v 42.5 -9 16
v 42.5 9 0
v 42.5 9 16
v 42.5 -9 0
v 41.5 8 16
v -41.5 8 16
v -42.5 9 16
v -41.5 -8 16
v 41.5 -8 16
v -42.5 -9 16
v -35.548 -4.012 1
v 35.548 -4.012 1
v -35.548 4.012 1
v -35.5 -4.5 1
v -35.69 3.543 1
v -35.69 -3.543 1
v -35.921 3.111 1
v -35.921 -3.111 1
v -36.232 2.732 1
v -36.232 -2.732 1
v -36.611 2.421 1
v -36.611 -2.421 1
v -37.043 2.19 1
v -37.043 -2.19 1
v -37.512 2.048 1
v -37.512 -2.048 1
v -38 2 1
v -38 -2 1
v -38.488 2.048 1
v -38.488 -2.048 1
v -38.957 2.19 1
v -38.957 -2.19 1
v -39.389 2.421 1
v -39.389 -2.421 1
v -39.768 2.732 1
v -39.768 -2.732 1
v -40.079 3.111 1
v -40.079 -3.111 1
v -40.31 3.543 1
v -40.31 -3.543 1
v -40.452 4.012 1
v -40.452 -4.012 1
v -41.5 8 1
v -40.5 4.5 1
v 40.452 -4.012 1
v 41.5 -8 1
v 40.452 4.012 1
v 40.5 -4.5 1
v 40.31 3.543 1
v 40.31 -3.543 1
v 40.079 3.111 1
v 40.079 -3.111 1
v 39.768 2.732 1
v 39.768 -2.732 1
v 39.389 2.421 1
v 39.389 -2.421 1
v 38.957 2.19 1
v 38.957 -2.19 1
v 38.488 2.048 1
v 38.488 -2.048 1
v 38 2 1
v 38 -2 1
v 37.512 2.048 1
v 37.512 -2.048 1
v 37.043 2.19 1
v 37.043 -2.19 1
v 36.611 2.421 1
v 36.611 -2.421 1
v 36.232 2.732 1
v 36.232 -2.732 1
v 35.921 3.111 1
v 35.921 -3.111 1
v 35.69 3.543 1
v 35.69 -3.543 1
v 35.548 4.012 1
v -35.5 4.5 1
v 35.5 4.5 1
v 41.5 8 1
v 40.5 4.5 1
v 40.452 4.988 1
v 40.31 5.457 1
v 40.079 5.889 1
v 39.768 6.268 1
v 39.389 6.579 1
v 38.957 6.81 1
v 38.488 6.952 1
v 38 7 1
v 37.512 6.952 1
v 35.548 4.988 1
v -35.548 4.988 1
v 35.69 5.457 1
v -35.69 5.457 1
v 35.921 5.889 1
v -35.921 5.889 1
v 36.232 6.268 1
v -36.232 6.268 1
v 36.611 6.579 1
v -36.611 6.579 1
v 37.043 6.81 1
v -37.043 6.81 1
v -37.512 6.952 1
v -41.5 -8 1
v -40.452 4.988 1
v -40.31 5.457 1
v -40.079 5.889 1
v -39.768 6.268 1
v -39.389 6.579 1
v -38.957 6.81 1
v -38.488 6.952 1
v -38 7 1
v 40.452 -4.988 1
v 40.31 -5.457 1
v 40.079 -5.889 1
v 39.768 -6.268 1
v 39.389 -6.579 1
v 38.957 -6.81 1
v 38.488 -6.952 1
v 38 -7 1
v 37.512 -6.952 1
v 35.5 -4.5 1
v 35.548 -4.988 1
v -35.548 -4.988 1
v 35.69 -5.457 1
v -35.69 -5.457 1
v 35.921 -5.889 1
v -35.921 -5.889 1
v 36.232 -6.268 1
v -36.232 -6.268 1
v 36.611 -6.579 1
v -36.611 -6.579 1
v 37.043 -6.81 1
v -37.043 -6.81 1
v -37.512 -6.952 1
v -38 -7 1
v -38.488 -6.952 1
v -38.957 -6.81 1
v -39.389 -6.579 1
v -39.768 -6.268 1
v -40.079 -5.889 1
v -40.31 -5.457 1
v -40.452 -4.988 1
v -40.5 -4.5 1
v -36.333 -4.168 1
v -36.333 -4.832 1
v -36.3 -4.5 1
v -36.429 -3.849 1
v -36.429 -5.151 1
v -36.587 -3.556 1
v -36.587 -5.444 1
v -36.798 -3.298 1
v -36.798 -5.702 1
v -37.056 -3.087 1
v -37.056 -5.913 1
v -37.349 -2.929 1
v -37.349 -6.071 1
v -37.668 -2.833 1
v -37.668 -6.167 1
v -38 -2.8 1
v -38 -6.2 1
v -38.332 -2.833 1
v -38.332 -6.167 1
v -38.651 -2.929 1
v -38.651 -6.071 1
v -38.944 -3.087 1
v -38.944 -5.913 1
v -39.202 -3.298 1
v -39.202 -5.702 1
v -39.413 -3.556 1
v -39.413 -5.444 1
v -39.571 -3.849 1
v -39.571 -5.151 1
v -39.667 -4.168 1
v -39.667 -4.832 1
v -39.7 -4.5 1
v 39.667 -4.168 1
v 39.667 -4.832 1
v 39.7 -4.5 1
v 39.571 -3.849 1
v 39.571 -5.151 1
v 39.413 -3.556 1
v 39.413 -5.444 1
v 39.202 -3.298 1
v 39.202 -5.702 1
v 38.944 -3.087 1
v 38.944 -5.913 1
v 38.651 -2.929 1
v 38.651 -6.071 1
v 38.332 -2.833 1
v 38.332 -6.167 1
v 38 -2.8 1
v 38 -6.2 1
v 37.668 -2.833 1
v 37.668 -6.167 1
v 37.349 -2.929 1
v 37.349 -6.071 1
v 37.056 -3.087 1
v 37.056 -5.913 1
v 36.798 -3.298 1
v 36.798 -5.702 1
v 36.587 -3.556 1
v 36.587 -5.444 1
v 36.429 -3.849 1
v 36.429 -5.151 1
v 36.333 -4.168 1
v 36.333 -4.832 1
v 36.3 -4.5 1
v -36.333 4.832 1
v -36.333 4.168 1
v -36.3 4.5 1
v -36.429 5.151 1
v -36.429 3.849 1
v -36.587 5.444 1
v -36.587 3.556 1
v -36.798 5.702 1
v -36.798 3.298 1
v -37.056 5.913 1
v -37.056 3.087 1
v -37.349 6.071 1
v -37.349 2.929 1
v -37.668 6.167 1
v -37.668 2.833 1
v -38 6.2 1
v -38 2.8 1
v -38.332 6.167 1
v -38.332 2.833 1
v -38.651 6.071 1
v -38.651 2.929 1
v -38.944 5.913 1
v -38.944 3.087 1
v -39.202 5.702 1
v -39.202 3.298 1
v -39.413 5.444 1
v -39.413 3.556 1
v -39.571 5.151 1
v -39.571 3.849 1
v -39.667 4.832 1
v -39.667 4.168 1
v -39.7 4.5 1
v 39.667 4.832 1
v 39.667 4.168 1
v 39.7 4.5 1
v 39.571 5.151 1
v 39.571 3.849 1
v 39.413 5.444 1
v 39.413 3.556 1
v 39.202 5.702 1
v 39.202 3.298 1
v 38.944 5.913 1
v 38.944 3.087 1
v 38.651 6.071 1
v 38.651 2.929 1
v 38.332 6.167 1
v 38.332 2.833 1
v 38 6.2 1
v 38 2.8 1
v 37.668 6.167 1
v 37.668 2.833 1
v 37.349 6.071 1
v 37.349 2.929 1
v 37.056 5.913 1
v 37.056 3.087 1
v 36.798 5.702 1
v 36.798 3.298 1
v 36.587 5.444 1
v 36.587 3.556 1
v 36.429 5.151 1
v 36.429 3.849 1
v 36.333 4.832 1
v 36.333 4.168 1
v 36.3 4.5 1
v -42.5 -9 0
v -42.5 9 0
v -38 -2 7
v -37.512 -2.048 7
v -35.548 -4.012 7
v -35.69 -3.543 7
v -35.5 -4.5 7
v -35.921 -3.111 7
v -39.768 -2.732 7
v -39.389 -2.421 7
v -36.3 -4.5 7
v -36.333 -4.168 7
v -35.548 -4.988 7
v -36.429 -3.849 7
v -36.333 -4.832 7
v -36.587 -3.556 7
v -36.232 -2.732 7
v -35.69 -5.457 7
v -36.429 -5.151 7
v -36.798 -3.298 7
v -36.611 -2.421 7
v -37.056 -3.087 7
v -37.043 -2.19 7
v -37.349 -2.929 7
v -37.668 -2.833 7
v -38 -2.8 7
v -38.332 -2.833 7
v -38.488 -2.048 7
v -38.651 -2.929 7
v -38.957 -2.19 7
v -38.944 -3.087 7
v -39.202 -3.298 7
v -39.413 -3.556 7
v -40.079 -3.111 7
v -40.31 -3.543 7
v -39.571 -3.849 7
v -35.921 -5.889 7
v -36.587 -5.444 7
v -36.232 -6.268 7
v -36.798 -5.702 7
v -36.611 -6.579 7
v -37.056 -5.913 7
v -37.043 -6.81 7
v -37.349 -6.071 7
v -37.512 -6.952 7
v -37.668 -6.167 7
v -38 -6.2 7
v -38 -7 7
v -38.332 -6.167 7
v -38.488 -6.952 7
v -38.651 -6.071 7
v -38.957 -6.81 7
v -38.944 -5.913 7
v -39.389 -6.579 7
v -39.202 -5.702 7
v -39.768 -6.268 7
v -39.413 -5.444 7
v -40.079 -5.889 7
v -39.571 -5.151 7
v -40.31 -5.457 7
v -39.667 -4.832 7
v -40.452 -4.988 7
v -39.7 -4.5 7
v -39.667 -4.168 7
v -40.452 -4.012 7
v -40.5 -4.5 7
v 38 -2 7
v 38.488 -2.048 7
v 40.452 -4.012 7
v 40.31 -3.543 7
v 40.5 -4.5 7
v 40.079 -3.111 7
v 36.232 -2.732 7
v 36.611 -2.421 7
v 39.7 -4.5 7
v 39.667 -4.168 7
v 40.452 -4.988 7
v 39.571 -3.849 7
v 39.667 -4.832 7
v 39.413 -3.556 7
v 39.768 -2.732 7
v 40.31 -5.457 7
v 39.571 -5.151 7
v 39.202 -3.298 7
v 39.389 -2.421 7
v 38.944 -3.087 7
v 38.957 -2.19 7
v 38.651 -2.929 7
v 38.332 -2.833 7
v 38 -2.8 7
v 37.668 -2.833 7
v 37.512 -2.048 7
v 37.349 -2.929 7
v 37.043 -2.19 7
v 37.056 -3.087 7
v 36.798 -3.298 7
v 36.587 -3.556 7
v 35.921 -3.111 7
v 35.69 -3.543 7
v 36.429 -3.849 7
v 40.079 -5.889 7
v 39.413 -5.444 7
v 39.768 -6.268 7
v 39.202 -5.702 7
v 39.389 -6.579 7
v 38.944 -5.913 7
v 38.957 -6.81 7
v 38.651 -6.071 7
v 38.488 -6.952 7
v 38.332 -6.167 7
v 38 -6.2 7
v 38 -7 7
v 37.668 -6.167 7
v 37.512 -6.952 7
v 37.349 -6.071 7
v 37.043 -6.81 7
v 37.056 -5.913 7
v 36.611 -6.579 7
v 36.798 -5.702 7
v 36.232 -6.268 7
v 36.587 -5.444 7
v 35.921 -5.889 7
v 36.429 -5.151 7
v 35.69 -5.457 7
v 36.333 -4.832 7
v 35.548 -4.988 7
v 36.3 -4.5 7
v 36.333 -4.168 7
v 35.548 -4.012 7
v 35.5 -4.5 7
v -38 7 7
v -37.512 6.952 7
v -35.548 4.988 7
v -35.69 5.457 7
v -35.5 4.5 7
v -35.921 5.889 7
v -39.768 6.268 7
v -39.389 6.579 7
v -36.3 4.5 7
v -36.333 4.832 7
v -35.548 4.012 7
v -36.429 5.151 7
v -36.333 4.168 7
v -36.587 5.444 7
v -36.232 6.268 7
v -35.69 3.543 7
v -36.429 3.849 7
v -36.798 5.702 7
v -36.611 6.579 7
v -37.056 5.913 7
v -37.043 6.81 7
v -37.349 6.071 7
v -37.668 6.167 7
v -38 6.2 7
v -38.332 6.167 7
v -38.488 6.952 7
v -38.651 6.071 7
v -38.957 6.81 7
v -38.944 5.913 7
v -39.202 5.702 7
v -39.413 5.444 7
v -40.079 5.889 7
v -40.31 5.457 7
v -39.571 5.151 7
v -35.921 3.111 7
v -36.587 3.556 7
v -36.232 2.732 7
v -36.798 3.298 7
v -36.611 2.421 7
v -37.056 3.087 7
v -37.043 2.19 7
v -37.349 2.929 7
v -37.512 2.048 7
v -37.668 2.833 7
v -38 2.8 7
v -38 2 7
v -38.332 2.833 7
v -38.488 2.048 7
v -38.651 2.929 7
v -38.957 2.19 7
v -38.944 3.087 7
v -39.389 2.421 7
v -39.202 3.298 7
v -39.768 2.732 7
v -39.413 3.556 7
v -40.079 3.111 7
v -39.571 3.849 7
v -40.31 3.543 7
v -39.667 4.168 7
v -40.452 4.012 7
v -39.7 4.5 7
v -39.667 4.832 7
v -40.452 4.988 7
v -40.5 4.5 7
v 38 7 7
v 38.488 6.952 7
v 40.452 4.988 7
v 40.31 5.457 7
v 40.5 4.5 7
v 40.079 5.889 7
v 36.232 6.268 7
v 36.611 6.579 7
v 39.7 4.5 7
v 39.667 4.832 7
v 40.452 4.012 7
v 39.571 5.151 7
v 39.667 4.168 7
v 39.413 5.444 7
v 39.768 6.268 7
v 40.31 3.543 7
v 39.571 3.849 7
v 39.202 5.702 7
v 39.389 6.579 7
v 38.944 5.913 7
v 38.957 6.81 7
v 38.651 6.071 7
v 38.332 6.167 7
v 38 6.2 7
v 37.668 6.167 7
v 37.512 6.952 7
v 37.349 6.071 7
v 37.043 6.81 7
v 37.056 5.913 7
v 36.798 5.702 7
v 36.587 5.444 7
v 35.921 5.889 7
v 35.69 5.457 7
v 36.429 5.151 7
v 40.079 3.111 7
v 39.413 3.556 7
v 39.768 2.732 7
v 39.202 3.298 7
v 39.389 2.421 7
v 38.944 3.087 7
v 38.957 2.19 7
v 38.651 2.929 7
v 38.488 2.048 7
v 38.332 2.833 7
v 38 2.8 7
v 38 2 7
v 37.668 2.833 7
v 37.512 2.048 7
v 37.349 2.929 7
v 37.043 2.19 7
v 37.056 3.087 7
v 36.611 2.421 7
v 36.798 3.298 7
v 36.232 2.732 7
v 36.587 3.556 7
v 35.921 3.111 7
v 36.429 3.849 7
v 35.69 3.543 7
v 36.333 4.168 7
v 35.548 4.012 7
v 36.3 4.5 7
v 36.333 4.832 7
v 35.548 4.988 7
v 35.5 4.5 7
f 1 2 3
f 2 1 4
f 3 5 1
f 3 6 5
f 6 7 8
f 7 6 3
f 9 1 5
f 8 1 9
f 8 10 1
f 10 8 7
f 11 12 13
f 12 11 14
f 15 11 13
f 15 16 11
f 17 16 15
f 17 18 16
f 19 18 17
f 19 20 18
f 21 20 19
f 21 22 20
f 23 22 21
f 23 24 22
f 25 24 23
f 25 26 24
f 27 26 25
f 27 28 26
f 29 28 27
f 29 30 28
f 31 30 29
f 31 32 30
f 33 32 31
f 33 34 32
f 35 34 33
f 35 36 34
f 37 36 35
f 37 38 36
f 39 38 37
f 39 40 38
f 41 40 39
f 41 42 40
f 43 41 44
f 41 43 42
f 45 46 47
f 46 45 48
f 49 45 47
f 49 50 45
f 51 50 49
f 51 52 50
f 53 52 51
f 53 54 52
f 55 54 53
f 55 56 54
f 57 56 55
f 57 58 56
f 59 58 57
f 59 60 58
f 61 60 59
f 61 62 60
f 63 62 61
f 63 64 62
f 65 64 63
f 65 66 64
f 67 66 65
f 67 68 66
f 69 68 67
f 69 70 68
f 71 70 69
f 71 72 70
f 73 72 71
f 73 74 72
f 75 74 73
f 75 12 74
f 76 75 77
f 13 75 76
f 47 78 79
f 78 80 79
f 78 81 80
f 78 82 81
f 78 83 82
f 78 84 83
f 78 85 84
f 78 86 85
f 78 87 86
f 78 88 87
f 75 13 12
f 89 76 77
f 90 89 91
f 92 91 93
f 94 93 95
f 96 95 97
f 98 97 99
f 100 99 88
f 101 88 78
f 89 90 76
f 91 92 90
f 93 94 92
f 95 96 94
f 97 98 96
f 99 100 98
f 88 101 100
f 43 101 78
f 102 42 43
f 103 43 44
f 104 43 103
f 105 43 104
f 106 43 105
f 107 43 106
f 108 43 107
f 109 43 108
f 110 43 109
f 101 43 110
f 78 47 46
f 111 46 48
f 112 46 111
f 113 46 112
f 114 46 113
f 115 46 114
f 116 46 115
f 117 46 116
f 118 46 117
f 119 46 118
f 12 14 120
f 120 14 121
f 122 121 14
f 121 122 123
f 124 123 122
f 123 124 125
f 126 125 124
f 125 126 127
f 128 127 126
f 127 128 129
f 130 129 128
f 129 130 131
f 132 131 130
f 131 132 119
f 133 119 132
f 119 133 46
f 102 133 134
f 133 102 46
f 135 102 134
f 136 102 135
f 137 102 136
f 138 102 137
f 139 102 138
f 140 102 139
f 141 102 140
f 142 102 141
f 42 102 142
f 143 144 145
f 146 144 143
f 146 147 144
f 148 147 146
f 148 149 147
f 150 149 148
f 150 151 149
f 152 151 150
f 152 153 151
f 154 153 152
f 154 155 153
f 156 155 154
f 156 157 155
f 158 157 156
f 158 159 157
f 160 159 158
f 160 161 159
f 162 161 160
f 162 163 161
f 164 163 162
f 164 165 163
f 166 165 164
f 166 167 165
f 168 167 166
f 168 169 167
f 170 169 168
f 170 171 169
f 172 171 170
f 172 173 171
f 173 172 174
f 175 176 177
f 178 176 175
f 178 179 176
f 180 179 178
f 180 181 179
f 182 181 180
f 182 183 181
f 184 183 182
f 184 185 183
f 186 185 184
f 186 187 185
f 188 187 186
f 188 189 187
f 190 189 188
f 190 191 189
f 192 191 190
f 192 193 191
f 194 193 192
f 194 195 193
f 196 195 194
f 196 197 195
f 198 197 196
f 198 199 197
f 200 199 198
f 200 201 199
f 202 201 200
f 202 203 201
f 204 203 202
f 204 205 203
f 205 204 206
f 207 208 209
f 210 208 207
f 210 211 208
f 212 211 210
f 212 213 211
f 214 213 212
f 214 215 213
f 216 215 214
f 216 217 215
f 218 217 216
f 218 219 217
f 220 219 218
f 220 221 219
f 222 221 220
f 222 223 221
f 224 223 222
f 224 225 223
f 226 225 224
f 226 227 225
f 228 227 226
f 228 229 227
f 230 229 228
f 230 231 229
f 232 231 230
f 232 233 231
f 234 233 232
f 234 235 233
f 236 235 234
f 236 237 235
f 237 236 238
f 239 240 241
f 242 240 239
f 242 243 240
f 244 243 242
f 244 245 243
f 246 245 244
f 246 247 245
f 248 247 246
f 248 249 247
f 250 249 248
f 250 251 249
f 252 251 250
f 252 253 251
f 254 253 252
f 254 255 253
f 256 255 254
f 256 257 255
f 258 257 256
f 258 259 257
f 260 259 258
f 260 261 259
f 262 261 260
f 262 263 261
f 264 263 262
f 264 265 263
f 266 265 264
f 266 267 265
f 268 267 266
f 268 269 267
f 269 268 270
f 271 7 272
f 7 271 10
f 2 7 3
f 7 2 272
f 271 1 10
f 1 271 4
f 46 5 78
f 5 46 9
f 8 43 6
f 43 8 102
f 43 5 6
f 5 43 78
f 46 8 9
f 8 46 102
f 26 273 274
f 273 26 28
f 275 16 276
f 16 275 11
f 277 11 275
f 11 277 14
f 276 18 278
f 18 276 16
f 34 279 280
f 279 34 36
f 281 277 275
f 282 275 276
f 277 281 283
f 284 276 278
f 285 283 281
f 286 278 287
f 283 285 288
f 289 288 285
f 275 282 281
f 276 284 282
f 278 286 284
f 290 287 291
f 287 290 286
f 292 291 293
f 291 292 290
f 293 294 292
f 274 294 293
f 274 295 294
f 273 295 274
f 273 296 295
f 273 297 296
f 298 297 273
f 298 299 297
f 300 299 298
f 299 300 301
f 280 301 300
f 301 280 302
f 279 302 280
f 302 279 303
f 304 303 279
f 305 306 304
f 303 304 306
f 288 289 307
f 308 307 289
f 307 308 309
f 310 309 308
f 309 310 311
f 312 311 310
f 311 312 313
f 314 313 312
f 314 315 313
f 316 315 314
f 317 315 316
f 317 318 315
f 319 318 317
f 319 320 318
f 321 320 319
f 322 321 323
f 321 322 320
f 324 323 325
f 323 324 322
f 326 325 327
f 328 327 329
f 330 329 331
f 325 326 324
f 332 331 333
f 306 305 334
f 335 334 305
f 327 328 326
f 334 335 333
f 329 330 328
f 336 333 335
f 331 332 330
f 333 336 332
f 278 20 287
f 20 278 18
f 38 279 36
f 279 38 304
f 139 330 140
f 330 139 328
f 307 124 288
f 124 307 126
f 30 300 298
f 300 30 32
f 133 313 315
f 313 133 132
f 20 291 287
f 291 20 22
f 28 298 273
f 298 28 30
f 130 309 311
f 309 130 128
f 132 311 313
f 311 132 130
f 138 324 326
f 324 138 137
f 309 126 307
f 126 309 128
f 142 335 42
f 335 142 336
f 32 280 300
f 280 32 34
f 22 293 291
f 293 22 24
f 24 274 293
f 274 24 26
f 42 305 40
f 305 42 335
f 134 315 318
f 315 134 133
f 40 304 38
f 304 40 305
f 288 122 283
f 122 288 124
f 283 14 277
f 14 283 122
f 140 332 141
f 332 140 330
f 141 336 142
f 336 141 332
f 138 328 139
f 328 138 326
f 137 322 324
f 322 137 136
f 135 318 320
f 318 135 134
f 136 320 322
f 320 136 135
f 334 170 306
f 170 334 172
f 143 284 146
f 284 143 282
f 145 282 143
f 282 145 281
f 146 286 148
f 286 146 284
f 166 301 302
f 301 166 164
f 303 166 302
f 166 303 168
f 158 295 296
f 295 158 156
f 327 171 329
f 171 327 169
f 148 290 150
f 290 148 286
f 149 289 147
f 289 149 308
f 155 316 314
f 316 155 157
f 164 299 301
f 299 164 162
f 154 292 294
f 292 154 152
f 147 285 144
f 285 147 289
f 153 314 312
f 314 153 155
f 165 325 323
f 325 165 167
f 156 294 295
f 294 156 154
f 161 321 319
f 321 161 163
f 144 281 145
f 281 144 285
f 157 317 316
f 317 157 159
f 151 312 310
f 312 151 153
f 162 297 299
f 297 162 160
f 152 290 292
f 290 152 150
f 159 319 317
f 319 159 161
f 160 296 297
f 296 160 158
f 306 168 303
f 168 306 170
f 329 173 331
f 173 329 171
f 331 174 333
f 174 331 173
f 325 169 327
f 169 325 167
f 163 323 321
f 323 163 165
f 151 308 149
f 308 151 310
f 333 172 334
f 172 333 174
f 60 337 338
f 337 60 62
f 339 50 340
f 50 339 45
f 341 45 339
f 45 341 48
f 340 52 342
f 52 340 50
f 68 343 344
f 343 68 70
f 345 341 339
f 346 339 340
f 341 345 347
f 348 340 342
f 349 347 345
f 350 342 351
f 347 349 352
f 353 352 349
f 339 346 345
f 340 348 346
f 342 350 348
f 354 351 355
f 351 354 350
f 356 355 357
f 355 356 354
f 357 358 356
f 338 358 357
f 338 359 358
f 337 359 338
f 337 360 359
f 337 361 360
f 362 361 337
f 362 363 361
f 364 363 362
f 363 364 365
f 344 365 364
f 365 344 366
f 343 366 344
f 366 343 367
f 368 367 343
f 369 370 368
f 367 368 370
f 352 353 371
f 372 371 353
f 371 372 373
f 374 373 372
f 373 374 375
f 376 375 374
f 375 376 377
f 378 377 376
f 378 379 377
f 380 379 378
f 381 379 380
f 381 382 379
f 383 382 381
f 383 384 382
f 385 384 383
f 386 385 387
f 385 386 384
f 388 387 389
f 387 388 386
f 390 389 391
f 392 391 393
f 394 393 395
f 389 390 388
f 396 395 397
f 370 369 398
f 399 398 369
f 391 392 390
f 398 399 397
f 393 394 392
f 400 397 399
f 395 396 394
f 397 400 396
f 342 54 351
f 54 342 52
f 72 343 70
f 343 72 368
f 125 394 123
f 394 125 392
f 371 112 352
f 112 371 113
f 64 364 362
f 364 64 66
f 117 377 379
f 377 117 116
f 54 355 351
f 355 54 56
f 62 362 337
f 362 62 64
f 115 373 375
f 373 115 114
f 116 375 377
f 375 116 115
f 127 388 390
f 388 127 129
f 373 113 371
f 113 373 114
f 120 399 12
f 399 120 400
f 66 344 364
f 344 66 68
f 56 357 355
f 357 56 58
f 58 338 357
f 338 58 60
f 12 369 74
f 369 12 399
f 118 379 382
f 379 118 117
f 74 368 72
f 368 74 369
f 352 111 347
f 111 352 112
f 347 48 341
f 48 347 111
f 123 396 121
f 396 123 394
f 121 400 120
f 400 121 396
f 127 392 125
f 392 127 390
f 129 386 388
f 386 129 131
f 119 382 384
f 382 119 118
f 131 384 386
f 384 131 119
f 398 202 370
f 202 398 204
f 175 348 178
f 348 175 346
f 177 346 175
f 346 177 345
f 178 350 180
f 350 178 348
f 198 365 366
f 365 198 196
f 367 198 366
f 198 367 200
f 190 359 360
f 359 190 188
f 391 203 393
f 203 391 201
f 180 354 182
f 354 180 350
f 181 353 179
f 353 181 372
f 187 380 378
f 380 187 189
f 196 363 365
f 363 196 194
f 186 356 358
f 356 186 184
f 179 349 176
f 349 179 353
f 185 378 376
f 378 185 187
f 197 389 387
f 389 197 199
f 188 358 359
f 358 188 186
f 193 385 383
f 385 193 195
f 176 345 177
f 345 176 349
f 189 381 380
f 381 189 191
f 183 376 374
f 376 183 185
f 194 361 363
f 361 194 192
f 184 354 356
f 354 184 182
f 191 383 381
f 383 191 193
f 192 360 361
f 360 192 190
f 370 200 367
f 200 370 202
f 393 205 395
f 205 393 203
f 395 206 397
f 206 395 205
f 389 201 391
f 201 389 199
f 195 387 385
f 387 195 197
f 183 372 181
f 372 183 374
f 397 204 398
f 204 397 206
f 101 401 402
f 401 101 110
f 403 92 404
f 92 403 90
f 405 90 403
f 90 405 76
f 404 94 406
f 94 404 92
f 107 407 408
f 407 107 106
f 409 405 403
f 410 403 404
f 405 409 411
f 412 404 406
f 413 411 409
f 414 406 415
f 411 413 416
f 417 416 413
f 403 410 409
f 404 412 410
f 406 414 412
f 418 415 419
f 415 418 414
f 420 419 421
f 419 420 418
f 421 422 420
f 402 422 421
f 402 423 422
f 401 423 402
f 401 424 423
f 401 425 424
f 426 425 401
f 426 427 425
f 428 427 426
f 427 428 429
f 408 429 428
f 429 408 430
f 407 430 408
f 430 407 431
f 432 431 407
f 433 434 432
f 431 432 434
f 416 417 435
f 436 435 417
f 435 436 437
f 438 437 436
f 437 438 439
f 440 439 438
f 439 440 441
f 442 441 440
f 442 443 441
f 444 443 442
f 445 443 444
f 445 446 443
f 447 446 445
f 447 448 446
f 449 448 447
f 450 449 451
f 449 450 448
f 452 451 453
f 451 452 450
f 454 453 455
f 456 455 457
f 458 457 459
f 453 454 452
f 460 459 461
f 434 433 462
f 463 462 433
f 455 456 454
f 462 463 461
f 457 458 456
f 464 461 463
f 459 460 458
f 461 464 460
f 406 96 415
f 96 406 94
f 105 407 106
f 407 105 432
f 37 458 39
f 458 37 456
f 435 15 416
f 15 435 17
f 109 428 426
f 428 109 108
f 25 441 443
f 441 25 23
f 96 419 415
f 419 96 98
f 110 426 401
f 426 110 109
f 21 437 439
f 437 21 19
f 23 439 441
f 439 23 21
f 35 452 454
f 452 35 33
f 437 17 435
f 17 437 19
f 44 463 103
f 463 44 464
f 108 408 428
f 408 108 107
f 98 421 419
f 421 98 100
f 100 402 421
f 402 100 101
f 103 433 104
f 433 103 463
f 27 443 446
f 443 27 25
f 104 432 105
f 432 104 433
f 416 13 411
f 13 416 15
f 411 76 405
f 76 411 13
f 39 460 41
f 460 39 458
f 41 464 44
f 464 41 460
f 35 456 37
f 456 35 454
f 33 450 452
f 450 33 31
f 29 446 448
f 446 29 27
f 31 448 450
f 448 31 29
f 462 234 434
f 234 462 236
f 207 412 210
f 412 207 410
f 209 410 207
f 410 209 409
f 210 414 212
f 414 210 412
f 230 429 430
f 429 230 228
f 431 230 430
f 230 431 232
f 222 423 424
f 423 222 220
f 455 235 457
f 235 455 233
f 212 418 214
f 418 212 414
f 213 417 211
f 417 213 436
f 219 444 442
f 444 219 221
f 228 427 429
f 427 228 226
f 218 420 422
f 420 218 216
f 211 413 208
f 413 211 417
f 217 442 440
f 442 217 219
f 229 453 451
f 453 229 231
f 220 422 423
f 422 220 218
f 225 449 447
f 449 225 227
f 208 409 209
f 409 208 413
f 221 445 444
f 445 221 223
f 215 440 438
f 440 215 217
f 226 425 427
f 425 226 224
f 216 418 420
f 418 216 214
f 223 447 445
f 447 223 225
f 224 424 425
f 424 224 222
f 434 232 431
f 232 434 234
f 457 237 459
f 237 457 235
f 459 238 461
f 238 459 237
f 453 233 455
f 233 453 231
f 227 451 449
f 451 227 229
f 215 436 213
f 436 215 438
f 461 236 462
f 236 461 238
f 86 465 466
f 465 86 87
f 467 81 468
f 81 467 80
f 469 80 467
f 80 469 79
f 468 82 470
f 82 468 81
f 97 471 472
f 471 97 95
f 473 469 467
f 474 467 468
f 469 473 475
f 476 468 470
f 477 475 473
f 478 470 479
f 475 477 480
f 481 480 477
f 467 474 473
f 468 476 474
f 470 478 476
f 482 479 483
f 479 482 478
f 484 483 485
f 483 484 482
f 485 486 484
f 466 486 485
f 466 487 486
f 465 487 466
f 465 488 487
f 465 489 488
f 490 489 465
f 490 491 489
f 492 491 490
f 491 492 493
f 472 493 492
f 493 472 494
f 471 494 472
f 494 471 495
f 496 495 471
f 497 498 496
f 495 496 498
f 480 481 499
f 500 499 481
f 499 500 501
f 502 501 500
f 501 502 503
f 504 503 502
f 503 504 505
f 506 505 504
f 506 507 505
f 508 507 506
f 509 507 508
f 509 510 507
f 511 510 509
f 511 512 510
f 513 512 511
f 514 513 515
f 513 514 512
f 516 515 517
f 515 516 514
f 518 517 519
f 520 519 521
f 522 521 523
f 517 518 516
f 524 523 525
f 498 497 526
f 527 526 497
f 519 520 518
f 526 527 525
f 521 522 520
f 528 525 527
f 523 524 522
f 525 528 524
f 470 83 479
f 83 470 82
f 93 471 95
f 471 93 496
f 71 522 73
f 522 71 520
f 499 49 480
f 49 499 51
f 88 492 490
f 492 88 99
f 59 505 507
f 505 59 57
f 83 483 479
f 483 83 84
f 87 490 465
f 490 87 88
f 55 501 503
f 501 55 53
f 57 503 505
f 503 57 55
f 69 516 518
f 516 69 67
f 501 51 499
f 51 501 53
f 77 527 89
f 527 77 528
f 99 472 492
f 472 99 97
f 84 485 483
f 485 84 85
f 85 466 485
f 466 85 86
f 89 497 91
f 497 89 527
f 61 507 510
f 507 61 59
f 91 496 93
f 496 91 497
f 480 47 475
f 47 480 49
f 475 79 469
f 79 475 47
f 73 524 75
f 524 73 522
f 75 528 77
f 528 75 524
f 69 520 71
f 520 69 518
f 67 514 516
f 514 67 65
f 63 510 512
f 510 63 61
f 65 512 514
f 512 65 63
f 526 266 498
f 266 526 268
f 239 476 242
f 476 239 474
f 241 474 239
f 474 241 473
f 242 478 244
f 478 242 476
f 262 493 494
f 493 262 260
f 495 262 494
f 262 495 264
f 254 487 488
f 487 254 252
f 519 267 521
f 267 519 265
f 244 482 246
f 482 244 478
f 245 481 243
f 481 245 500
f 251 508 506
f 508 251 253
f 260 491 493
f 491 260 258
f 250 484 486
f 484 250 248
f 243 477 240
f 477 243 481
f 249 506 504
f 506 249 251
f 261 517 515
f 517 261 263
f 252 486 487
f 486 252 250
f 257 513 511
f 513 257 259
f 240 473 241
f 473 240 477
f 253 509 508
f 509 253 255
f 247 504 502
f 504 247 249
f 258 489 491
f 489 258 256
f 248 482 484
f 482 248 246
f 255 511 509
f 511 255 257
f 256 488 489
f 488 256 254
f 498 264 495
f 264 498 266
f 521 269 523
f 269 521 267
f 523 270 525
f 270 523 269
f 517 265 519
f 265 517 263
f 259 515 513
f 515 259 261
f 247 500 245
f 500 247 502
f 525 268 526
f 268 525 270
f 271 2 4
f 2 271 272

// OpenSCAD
// (79.5 - 72.5)/2
// (12.5 - 5.5)/2

shell_thickness = 1.0;

box_inside_width = 83.0;
box_inside_height = 16.0;
box_inside_depth = 15.0;

nut_inside_daimeter = 3.4; 
nut_outside_daimeter = 5.0;
nut_height = box_inside_depth - 9;

nut_x_distance = 76.0;
nut_y_distance = 9.0;

translate([0,0,0.5]){
    cube([box_inside_width + 2 * shell_thickness, box_inside_height + 2 * shell_thickness, shell_thickness], center=true);
}

translate([0,0,1]){
    translate([0,0,box_inside_depth/2]) {
        difference() {
            cube([box_inside_width + 2 * shell_thickness, box_inside_height + 2 * shell_thickness, box_inside_depth], center=true);
            cube([box_inside_width, box_inside_height, box_inside_depth+0.01], center=true);
        }
    }

    for(y = [-nut_y_distance/2,nut_y_distance/2]) {
        for (x = [-nut_x_distance/2, nut_x_distance/2]) {
            translate([x, y, nut_height/2]) {
                difference() {
                    cylinder(h=nut_height, d=nut_outside_daimeter, $fn=32, center=true);
                    cylinder(h=nut_height+0.01, d=nut_inside_daimeter, $fn=32, center=true);            }
            }
        }
    }    
}
